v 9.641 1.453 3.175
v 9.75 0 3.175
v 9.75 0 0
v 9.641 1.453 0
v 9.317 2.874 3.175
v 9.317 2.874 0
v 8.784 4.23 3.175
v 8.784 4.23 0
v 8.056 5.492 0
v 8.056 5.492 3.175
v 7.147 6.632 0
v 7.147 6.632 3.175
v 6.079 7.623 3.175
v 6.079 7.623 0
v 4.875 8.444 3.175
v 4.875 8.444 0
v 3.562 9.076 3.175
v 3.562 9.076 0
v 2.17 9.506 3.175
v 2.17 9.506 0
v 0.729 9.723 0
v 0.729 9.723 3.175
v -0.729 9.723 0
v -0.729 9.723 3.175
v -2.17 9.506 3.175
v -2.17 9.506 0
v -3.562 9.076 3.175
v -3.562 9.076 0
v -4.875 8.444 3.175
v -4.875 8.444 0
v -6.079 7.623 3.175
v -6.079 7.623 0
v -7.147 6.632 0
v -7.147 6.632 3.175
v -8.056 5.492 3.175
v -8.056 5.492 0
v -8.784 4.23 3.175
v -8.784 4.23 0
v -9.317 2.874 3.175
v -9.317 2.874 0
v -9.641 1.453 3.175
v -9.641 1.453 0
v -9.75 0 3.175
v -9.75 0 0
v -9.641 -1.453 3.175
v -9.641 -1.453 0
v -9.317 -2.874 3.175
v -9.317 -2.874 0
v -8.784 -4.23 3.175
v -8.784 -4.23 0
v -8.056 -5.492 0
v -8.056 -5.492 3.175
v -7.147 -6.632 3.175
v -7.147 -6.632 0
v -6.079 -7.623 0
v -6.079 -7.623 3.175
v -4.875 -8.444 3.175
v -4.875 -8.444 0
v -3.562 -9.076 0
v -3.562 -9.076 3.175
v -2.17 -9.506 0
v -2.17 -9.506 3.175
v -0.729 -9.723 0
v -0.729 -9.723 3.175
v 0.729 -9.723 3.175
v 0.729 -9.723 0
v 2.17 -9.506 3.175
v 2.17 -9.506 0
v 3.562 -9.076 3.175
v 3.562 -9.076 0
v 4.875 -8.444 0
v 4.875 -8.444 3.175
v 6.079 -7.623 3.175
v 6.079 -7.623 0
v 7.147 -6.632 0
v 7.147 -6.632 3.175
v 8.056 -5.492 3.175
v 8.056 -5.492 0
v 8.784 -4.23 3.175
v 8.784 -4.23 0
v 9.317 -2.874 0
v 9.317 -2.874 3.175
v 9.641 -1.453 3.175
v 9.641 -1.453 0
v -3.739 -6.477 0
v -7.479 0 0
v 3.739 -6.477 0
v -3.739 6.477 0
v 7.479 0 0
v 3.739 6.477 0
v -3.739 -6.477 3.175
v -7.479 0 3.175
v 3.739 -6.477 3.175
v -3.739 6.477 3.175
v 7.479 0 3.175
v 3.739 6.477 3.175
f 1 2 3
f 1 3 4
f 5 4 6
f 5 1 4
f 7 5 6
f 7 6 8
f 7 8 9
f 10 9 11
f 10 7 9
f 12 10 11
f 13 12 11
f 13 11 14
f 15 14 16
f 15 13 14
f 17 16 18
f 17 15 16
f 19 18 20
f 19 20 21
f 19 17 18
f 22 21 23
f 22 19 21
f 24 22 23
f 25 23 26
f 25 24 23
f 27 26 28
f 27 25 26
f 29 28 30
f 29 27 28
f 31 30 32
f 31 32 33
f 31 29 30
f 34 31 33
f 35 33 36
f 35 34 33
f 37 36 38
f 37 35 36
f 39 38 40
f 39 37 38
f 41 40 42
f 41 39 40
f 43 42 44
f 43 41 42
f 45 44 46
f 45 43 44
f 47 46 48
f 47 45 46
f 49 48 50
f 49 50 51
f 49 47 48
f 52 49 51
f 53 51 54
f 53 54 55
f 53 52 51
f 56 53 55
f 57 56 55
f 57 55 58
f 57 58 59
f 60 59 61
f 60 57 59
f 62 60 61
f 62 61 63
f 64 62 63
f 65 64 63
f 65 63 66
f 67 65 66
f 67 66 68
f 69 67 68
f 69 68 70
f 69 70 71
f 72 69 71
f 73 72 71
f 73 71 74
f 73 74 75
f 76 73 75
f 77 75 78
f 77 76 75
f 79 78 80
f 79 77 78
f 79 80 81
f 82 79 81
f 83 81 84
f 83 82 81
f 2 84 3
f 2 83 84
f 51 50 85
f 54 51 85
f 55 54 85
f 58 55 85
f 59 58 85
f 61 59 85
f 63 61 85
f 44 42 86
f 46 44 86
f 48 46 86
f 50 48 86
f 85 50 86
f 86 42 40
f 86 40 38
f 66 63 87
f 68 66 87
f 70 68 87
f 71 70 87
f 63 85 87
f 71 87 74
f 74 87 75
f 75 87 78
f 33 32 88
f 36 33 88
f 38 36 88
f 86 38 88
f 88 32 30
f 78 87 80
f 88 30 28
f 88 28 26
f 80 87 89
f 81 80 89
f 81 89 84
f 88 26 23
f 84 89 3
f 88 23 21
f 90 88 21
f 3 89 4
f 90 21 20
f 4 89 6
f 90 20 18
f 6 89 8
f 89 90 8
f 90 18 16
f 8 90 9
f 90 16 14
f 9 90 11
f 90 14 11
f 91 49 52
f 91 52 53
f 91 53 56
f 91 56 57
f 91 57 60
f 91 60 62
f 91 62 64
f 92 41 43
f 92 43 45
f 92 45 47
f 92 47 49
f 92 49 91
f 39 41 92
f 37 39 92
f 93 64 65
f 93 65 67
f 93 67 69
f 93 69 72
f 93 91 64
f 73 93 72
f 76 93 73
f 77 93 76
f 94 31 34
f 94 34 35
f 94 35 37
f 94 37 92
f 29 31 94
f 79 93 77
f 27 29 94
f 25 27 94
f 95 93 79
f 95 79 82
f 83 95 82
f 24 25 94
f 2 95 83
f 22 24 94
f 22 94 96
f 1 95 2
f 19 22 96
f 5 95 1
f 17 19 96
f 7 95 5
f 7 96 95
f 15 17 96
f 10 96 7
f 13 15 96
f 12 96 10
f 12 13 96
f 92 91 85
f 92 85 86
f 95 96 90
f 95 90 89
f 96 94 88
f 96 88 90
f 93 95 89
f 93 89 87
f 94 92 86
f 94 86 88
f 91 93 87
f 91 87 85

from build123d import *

# Parameters (mm, degrees)
SKETCH1_R           = 9.75
BOSS_EXTRUDE1_DEPTH = 3.175


with BuildPart() as part:
    # Sketch1 → Boss-Extrude1 (new body)
    with BuildSketch(Plane.XY.offset(3.175)):
        Circle(SKETCH1_R)
        Polygon((-3.739497694, 6.477), (3.739497694, 6.477), (7.478995387, 0), (3.739497694, -6.477), (-3.739497694, -6.477), (-7.478995387, 0), align=None, mode=Mode.SUBTRACT)
    extrude(amount=-BOSS_EXTRUDE1_DEPTH)


solid = part.part
